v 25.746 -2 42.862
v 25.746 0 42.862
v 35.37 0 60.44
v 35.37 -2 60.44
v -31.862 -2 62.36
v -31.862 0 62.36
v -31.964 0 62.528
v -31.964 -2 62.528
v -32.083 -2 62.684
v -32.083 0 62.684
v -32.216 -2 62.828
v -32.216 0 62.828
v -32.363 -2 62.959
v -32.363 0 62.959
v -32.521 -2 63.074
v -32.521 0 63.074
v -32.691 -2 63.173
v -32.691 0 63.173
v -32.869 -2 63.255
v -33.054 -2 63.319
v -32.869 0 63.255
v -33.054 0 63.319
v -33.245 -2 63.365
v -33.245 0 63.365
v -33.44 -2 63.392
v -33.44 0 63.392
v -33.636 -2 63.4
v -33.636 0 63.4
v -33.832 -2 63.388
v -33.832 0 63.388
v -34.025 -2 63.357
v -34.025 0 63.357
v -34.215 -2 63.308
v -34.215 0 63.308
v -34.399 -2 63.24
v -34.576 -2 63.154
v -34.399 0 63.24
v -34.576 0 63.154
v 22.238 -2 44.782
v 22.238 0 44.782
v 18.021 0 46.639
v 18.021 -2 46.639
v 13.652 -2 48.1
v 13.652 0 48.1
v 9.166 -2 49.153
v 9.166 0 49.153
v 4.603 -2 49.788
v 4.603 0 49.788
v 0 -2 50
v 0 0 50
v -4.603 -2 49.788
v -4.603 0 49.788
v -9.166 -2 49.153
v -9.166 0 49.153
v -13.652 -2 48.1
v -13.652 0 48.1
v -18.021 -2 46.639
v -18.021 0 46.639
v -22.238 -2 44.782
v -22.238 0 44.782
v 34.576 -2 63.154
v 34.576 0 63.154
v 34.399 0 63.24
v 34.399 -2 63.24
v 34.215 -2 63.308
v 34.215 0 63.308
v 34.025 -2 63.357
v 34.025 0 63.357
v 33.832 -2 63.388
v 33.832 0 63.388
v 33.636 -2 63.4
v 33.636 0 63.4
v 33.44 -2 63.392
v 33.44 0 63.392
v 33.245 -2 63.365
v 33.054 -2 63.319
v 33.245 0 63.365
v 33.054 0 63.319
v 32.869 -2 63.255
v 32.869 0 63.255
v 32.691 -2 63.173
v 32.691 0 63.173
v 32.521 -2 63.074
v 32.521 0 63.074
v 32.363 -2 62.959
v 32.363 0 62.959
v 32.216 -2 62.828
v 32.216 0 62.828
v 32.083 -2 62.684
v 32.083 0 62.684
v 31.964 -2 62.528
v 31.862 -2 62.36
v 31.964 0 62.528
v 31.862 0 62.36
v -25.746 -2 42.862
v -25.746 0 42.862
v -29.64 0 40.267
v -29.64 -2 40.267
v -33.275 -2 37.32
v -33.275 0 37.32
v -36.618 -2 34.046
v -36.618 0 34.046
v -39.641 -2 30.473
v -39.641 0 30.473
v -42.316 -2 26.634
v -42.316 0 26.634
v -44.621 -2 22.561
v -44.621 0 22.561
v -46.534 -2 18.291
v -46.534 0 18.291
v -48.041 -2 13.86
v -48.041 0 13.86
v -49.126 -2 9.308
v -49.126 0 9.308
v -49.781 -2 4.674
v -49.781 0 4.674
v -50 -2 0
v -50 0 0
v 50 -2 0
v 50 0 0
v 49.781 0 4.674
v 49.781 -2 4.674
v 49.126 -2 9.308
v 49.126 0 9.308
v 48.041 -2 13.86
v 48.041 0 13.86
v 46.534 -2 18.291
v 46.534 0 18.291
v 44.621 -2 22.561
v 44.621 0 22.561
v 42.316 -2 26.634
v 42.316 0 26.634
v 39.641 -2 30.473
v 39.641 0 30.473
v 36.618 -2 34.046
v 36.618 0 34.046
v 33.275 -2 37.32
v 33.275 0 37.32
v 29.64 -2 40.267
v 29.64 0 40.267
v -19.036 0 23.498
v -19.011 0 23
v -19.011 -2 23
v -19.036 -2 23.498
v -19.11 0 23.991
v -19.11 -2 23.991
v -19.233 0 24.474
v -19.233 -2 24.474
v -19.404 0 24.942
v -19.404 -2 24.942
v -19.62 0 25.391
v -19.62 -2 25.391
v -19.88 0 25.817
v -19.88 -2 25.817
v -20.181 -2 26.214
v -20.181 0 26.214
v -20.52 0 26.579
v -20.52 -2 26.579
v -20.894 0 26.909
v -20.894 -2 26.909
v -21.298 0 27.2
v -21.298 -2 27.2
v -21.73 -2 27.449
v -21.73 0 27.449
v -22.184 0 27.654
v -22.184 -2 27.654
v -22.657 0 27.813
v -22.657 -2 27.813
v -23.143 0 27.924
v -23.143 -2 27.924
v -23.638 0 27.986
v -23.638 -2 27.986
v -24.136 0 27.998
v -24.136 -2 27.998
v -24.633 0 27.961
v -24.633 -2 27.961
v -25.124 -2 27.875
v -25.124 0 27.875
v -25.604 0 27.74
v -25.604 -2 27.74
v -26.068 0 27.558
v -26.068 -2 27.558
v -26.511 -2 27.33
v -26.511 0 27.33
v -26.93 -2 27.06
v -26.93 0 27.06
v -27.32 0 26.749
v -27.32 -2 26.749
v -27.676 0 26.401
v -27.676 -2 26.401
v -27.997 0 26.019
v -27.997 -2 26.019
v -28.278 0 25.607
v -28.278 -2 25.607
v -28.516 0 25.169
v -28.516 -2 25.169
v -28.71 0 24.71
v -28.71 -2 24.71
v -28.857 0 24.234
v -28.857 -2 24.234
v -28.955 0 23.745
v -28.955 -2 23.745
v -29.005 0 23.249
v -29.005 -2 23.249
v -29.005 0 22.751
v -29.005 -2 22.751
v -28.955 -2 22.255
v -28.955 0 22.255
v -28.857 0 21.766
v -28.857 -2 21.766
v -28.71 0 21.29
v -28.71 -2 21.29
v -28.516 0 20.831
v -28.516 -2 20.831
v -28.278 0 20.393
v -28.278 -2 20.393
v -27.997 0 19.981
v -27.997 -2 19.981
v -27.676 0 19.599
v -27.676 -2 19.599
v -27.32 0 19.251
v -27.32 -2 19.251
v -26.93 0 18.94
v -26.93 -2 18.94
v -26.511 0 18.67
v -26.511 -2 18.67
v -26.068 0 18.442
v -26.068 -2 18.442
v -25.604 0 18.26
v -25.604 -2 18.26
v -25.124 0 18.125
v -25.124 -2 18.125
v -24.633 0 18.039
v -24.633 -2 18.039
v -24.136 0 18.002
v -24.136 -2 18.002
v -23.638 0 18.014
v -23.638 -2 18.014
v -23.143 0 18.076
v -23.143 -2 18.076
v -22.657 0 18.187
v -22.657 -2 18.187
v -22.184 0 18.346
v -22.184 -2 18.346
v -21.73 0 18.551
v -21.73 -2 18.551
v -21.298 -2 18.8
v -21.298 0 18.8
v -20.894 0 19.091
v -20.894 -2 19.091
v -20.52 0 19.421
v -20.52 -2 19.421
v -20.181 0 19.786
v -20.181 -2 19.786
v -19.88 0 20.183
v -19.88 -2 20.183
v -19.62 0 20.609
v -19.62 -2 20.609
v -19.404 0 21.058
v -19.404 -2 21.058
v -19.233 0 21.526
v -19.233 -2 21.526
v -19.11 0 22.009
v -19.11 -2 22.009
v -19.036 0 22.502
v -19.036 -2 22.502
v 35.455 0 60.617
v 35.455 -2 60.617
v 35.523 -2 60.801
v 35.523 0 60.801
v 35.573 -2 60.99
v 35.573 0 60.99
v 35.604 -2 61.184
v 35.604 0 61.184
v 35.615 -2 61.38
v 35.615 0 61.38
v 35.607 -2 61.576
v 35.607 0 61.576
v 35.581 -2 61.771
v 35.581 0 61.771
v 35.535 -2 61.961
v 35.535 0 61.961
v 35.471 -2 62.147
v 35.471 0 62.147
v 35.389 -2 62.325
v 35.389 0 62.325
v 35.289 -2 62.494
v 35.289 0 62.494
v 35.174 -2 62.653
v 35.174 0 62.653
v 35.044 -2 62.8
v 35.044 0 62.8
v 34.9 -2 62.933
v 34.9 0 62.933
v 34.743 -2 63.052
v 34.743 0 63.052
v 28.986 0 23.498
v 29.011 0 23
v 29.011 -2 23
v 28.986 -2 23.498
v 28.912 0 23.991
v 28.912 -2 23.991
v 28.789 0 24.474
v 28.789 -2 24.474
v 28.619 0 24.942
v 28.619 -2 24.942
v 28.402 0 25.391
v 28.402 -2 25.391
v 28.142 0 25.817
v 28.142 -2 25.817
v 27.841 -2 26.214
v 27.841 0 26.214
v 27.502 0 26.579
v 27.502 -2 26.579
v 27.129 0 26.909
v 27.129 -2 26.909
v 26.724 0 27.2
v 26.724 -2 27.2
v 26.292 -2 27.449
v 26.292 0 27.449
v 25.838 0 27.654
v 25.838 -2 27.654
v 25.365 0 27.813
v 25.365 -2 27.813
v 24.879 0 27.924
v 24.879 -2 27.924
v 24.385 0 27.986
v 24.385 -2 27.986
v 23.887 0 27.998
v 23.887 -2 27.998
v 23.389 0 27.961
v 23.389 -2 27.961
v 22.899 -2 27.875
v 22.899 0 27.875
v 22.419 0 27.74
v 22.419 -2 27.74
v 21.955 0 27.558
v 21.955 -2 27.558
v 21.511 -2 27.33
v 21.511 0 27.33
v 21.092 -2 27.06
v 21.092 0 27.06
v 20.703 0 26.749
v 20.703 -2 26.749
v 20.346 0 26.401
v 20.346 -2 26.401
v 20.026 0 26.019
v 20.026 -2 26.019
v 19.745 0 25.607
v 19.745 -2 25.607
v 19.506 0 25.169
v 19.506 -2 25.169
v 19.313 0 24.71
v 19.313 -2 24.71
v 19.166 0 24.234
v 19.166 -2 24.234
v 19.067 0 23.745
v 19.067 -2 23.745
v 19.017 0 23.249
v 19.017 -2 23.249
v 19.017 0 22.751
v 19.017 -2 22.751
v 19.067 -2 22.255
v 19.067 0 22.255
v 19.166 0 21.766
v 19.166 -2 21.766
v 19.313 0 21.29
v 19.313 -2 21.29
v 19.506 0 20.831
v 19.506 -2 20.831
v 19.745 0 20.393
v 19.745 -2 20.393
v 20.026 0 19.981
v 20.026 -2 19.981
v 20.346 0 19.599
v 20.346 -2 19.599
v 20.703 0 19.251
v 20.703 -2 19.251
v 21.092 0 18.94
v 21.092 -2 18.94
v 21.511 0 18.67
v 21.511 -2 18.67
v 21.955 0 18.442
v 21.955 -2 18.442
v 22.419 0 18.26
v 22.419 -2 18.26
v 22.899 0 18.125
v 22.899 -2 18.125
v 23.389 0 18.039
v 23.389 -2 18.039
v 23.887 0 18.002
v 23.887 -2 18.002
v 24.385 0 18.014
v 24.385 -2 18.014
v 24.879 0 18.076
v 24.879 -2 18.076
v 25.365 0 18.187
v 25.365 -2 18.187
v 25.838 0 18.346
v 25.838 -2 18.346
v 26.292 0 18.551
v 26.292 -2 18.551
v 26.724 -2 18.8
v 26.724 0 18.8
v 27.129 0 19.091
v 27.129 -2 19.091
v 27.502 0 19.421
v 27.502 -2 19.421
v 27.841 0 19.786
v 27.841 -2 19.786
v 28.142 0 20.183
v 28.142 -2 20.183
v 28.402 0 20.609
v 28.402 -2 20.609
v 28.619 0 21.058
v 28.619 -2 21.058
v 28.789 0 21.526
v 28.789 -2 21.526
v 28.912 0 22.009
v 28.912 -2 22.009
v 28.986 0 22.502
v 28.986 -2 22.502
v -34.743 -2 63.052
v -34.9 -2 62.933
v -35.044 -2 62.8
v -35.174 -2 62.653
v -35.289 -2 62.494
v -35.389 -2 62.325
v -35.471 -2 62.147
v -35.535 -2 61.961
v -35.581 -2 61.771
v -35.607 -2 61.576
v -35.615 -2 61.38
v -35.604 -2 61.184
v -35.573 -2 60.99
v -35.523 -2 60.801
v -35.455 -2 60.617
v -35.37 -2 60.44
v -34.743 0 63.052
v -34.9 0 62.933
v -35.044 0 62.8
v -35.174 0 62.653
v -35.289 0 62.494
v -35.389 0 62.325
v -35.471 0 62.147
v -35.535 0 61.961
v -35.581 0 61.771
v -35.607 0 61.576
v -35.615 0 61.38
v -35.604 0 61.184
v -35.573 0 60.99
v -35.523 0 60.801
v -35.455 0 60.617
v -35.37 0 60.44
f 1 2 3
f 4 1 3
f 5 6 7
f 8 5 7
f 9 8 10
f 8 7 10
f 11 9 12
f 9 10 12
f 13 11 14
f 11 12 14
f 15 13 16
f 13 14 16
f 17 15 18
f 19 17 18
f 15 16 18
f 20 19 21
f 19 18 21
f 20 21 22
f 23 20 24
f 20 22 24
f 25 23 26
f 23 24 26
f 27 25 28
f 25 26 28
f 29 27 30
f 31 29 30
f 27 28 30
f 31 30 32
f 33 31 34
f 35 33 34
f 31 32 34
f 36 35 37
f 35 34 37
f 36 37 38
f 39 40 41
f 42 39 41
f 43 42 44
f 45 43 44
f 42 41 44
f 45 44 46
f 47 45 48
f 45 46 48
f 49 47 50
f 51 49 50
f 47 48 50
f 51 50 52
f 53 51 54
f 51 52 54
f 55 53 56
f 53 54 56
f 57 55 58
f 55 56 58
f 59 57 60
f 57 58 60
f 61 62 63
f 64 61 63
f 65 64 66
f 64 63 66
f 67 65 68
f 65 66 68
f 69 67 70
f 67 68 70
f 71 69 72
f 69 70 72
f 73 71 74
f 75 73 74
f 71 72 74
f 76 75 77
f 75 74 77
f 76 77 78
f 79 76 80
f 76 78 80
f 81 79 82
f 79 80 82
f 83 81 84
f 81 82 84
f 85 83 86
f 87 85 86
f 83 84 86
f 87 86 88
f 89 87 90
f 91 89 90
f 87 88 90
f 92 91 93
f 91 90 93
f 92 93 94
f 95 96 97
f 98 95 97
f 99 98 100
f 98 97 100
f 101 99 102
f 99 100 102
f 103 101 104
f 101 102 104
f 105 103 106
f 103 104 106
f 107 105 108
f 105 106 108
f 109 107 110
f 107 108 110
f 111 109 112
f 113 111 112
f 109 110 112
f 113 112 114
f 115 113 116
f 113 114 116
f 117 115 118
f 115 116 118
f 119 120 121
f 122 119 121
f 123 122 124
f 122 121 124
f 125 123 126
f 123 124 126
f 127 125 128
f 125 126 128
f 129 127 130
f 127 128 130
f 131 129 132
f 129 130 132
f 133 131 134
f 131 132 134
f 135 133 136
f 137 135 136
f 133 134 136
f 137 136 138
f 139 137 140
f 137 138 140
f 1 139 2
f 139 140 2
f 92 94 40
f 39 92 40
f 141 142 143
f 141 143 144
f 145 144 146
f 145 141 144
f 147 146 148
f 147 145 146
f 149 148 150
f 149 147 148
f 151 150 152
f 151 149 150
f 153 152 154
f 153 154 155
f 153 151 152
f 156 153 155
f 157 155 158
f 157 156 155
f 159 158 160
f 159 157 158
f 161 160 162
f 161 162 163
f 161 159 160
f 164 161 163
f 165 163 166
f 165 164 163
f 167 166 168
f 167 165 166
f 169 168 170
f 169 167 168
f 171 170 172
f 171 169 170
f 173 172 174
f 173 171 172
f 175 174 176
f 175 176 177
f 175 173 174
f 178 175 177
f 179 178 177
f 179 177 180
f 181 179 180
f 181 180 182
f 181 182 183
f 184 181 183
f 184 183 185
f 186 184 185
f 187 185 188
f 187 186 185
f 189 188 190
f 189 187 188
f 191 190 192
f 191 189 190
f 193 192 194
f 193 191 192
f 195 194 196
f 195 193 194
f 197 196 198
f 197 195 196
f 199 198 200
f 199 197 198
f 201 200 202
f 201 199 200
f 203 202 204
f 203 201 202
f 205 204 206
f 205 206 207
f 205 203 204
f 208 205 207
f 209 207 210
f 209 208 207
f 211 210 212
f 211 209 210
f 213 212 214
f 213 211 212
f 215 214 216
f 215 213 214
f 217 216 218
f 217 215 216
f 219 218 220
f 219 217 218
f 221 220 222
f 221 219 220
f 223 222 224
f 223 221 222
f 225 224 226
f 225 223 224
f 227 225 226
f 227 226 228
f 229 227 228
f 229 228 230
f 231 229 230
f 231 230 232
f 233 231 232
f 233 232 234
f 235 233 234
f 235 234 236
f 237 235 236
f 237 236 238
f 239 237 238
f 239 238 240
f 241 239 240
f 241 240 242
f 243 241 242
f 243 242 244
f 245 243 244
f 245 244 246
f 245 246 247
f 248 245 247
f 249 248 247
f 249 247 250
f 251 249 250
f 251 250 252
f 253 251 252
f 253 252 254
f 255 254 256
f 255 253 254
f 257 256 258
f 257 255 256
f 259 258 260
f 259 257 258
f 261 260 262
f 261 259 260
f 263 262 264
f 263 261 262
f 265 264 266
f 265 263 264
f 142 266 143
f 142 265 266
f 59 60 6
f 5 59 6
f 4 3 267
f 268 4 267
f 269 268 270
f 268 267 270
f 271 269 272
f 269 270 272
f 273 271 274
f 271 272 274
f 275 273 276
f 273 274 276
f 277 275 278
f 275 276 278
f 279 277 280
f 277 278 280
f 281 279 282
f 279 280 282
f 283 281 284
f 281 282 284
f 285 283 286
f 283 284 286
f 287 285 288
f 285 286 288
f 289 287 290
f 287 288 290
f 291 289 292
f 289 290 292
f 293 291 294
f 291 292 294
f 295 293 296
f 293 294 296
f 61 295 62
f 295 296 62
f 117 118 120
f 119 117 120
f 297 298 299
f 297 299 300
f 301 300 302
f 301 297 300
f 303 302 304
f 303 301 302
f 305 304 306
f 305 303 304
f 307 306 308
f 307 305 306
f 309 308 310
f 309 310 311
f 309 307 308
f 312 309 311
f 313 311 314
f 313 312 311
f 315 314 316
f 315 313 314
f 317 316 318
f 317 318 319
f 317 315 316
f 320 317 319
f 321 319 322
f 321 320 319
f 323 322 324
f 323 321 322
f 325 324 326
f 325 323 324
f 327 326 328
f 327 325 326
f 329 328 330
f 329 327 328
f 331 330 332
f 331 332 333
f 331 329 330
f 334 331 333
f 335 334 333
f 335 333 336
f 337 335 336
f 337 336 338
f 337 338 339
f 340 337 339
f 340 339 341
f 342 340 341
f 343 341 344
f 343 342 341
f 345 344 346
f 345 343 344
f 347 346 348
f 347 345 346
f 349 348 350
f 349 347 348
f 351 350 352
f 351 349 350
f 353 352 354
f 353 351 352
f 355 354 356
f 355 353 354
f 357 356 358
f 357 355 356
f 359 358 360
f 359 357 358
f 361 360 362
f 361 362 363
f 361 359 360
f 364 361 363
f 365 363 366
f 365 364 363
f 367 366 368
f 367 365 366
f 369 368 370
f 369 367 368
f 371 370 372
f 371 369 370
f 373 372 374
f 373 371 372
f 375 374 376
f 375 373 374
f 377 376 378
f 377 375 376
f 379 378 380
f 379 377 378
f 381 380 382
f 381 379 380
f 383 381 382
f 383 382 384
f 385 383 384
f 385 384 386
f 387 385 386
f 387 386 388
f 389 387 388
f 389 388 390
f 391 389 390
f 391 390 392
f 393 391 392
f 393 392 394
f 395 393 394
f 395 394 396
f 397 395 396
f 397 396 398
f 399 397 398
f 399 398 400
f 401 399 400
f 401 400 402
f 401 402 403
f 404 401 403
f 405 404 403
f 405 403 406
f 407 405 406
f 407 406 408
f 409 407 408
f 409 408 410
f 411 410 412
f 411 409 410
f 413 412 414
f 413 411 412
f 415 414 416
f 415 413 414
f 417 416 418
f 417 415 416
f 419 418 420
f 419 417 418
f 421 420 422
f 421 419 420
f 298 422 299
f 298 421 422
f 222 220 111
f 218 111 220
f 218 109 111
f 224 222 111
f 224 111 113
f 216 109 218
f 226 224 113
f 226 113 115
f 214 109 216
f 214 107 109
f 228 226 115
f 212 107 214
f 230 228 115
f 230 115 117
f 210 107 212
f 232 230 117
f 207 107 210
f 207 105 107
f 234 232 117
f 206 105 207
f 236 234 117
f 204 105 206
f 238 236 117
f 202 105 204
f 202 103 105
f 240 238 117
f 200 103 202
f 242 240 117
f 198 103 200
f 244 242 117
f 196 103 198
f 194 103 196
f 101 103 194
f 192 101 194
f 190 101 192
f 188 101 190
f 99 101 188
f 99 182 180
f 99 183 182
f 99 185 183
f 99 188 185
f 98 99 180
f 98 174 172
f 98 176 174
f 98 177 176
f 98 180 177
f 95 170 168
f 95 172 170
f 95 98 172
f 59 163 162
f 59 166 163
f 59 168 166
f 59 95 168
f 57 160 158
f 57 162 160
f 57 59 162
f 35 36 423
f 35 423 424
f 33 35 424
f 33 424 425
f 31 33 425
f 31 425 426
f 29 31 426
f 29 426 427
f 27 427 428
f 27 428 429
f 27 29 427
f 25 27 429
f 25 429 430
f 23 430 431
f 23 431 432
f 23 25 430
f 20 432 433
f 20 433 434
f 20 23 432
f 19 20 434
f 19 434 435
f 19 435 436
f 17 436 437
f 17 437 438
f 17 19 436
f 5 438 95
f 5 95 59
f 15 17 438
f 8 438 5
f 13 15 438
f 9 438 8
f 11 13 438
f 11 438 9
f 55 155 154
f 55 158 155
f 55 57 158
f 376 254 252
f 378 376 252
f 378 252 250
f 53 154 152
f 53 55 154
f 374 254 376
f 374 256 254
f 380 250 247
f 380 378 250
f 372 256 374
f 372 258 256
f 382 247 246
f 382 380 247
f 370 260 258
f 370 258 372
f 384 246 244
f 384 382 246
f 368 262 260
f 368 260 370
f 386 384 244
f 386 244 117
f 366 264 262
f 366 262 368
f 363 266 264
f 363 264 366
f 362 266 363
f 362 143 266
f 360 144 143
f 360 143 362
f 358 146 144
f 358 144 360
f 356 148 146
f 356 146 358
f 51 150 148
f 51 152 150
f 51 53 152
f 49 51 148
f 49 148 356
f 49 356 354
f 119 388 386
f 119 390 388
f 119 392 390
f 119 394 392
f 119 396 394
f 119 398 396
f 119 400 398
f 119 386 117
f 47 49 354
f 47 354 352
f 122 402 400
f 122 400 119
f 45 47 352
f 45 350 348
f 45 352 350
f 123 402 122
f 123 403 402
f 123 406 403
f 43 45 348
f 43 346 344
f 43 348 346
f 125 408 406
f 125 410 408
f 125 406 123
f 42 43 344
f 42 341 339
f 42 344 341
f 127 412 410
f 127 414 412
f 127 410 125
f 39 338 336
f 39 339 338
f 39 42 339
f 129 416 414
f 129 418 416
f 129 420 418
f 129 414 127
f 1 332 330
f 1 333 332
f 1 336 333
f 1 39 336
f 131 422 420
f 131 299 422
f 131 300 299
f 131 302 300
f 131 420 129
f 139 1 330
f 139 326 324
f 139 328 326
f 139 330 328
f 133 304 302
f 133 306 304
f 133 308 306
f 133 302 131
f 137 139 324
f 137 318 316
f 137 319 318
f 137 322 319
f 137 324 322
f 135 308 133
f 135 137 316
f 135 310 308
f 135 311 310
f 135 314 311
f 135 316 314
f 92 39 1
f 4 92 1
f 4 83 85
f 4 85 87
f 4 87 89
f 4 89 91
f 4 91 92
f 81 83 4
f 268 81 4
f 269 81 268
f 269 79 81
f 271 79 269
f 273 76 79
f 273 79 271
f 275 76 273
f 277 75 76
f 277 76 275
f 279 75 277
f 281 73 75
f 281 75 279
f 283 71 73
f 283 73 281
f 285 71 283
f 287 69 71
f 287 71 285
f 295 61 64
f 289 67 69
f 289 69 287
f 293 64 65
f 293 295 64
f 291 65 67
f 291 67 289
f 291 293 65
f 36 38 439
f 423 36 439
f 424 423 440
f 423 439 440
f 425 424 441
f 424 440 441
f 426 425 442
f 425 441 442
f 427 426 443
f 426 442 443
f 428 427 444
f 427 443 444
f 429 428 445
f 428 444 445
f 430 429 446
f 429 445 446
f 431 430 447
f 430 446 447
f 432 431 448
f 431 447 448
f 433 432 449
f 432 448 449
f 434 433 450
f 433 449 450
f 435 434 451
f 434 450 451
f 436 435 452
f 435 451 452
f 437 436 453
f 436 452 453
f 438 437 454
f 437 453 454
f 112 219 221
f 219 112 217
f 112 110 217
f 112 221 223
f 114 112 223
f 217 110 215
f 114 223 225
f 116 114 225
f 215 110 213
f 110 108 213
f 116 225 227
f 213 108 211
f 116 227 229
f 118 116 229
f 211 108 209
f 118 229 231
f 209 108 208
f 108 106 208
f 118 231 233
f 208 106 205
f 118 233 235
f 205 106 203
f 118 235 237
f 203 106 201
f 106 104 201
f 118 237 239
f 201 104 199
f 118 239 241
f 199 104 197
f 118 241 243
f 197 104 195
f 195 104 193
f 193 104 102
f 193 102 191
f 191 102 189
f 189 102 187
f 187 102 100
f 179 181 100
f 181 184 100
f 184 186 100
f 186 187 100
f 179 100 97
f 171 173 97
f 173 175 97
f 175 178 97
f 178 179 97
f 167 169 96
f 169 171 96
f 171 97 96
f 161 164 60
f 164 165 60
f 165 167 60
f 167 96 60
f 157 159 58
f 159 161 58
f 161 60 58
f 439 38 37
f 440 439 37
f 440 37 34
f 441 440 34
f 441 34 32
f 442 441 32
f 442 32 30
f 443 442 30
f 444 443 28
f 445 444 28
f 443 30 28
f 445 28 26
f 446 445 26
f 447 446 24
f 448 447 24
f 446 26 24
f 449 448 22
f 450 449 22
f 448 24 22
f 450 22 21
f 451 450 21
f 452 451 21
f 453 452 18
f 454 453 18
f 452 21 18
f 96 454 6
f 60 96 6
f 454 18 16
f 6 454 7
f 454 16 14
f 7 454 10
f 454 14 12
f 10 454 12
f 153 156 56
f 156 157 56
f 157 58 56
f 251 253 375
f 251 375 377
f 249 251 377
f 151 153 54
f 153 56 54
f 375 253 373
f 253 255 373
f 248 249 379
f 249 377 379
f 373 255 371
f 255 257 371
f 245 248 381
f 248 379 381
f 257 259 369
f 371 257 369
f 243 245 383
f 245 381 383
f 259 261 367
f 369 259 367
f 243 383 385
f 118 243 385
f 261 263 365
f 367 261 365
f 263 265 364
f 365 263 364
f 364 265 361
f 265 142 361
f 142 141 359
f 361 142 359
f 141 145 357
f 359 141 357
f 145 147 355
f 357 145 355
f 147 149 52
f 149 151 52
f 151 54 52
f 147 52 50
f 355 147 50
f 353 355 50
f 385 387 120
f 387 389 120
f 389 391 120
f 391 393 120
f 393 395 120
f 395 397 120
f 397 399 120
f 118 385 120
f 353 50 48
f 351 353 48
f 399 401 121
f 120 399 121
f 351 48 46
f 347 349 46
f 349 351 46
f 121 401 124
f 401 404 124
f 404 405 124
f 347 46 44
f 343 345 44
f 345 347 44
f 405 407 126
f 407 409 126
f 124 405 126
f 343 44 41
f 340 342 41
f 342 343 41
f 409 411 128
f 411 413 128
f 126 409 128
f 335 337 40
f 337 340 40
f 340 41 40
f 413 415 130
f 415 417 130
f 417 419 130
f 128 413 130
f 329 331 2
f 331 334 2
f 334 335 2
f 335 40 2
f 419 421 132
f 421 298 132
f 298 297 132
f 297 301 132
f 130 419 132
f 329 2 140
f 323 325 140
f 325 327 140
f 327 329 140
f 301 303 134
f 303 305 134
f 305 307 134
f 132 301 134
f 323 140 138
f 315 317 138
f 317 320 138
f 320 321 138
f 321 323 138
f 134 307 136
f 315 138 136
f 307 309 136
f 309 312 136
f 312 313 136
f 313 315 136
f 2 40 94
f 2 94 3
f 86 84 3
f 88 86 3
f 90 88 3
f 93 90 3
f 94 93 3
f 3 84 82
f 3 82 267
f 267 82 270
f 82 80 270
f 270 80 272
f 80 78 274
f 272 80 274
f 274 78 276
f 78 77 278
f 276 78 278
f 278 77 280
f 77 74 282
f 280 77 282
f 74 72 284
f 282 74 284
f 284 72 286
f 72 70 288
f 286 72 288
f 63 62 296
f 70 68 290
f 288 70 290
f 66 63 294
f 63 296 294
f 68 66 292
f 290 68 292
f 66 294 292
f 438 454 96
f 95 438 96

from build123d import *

# Parameters (mm, degrees)
F0_R     = 5
F1_DEPTH = 2


with BuildPart() as f1:
    # F0 (on Front) → F1 (new body)
    with BuildSketch(Plane.XZ):
        with BuildLine():
            ThreePointArc((22.238024, 44.782477), (24.011175, 43.857308), (25.745907, 42.861967))
            Line((25.745907, 42.861967), (35.369586, 60.439977))
            ThreePointArc((35.369586, 60.439977), (35.534871, 61.961453), (34.5759, 63.154173))
            ThreePointArc((34.5759, 63.154173), (33.054424, 63.319458), (31.861703, 62.360486))
            Line((31.861703, 62.360486), (22.238024, 44.782477))
        make_face()
        with BuildLine():
            Line((-35.369586, 60.439977), (-25.745907, 42.861967))
            ThreePointArc((-25.745907, 42.861967), (-24.011175, 43.857308), (-22.238024, 44.782477))
            Line((-22.238024, 44.782477), (-31.861703, 62.360486))
            ThreePointArc((-31.861703, 62.360486), (-33.054424, 63.319458), (-34.5759, 63.154173))
            ThreePointArc((-34.5759, 63.154173), (-35.534871, 61.961453), (-35.369586, 60.439977))
        make_face()
        with BuildLine():
            ThreePointArc((-25.745907, 42.861967), (-43.516062, 24.624222), (-50, 0))
            Line((-50, 0), (50, 0))
            ThreePointArc((50, 0), (43.516062, 24.624222), (25.745907, 42.861967))
            ThreePointArc((25.745907, 42.861967), (24.011175, 43.857308), (22.238024, 44.782477))
            ThreePointArc((22.238024, 44.782477), (0, 50), (-22.238024, 44.782477))
            ThreePointArc((-22.238024, 44.782477), (-24.011175, 43.857308), (-25.745907, 42.861967))
        make_face()
        with Locations((-24.011175, 23)):
            Circle(F0_R, mode=Mode.SUBTRACT)
        with Locations((24.011175, 23)):
            Circle(F0_R, mode=Mode.SUBTRACT)
    extrude(amount=F1_DEPTH)


solid = f1.part
